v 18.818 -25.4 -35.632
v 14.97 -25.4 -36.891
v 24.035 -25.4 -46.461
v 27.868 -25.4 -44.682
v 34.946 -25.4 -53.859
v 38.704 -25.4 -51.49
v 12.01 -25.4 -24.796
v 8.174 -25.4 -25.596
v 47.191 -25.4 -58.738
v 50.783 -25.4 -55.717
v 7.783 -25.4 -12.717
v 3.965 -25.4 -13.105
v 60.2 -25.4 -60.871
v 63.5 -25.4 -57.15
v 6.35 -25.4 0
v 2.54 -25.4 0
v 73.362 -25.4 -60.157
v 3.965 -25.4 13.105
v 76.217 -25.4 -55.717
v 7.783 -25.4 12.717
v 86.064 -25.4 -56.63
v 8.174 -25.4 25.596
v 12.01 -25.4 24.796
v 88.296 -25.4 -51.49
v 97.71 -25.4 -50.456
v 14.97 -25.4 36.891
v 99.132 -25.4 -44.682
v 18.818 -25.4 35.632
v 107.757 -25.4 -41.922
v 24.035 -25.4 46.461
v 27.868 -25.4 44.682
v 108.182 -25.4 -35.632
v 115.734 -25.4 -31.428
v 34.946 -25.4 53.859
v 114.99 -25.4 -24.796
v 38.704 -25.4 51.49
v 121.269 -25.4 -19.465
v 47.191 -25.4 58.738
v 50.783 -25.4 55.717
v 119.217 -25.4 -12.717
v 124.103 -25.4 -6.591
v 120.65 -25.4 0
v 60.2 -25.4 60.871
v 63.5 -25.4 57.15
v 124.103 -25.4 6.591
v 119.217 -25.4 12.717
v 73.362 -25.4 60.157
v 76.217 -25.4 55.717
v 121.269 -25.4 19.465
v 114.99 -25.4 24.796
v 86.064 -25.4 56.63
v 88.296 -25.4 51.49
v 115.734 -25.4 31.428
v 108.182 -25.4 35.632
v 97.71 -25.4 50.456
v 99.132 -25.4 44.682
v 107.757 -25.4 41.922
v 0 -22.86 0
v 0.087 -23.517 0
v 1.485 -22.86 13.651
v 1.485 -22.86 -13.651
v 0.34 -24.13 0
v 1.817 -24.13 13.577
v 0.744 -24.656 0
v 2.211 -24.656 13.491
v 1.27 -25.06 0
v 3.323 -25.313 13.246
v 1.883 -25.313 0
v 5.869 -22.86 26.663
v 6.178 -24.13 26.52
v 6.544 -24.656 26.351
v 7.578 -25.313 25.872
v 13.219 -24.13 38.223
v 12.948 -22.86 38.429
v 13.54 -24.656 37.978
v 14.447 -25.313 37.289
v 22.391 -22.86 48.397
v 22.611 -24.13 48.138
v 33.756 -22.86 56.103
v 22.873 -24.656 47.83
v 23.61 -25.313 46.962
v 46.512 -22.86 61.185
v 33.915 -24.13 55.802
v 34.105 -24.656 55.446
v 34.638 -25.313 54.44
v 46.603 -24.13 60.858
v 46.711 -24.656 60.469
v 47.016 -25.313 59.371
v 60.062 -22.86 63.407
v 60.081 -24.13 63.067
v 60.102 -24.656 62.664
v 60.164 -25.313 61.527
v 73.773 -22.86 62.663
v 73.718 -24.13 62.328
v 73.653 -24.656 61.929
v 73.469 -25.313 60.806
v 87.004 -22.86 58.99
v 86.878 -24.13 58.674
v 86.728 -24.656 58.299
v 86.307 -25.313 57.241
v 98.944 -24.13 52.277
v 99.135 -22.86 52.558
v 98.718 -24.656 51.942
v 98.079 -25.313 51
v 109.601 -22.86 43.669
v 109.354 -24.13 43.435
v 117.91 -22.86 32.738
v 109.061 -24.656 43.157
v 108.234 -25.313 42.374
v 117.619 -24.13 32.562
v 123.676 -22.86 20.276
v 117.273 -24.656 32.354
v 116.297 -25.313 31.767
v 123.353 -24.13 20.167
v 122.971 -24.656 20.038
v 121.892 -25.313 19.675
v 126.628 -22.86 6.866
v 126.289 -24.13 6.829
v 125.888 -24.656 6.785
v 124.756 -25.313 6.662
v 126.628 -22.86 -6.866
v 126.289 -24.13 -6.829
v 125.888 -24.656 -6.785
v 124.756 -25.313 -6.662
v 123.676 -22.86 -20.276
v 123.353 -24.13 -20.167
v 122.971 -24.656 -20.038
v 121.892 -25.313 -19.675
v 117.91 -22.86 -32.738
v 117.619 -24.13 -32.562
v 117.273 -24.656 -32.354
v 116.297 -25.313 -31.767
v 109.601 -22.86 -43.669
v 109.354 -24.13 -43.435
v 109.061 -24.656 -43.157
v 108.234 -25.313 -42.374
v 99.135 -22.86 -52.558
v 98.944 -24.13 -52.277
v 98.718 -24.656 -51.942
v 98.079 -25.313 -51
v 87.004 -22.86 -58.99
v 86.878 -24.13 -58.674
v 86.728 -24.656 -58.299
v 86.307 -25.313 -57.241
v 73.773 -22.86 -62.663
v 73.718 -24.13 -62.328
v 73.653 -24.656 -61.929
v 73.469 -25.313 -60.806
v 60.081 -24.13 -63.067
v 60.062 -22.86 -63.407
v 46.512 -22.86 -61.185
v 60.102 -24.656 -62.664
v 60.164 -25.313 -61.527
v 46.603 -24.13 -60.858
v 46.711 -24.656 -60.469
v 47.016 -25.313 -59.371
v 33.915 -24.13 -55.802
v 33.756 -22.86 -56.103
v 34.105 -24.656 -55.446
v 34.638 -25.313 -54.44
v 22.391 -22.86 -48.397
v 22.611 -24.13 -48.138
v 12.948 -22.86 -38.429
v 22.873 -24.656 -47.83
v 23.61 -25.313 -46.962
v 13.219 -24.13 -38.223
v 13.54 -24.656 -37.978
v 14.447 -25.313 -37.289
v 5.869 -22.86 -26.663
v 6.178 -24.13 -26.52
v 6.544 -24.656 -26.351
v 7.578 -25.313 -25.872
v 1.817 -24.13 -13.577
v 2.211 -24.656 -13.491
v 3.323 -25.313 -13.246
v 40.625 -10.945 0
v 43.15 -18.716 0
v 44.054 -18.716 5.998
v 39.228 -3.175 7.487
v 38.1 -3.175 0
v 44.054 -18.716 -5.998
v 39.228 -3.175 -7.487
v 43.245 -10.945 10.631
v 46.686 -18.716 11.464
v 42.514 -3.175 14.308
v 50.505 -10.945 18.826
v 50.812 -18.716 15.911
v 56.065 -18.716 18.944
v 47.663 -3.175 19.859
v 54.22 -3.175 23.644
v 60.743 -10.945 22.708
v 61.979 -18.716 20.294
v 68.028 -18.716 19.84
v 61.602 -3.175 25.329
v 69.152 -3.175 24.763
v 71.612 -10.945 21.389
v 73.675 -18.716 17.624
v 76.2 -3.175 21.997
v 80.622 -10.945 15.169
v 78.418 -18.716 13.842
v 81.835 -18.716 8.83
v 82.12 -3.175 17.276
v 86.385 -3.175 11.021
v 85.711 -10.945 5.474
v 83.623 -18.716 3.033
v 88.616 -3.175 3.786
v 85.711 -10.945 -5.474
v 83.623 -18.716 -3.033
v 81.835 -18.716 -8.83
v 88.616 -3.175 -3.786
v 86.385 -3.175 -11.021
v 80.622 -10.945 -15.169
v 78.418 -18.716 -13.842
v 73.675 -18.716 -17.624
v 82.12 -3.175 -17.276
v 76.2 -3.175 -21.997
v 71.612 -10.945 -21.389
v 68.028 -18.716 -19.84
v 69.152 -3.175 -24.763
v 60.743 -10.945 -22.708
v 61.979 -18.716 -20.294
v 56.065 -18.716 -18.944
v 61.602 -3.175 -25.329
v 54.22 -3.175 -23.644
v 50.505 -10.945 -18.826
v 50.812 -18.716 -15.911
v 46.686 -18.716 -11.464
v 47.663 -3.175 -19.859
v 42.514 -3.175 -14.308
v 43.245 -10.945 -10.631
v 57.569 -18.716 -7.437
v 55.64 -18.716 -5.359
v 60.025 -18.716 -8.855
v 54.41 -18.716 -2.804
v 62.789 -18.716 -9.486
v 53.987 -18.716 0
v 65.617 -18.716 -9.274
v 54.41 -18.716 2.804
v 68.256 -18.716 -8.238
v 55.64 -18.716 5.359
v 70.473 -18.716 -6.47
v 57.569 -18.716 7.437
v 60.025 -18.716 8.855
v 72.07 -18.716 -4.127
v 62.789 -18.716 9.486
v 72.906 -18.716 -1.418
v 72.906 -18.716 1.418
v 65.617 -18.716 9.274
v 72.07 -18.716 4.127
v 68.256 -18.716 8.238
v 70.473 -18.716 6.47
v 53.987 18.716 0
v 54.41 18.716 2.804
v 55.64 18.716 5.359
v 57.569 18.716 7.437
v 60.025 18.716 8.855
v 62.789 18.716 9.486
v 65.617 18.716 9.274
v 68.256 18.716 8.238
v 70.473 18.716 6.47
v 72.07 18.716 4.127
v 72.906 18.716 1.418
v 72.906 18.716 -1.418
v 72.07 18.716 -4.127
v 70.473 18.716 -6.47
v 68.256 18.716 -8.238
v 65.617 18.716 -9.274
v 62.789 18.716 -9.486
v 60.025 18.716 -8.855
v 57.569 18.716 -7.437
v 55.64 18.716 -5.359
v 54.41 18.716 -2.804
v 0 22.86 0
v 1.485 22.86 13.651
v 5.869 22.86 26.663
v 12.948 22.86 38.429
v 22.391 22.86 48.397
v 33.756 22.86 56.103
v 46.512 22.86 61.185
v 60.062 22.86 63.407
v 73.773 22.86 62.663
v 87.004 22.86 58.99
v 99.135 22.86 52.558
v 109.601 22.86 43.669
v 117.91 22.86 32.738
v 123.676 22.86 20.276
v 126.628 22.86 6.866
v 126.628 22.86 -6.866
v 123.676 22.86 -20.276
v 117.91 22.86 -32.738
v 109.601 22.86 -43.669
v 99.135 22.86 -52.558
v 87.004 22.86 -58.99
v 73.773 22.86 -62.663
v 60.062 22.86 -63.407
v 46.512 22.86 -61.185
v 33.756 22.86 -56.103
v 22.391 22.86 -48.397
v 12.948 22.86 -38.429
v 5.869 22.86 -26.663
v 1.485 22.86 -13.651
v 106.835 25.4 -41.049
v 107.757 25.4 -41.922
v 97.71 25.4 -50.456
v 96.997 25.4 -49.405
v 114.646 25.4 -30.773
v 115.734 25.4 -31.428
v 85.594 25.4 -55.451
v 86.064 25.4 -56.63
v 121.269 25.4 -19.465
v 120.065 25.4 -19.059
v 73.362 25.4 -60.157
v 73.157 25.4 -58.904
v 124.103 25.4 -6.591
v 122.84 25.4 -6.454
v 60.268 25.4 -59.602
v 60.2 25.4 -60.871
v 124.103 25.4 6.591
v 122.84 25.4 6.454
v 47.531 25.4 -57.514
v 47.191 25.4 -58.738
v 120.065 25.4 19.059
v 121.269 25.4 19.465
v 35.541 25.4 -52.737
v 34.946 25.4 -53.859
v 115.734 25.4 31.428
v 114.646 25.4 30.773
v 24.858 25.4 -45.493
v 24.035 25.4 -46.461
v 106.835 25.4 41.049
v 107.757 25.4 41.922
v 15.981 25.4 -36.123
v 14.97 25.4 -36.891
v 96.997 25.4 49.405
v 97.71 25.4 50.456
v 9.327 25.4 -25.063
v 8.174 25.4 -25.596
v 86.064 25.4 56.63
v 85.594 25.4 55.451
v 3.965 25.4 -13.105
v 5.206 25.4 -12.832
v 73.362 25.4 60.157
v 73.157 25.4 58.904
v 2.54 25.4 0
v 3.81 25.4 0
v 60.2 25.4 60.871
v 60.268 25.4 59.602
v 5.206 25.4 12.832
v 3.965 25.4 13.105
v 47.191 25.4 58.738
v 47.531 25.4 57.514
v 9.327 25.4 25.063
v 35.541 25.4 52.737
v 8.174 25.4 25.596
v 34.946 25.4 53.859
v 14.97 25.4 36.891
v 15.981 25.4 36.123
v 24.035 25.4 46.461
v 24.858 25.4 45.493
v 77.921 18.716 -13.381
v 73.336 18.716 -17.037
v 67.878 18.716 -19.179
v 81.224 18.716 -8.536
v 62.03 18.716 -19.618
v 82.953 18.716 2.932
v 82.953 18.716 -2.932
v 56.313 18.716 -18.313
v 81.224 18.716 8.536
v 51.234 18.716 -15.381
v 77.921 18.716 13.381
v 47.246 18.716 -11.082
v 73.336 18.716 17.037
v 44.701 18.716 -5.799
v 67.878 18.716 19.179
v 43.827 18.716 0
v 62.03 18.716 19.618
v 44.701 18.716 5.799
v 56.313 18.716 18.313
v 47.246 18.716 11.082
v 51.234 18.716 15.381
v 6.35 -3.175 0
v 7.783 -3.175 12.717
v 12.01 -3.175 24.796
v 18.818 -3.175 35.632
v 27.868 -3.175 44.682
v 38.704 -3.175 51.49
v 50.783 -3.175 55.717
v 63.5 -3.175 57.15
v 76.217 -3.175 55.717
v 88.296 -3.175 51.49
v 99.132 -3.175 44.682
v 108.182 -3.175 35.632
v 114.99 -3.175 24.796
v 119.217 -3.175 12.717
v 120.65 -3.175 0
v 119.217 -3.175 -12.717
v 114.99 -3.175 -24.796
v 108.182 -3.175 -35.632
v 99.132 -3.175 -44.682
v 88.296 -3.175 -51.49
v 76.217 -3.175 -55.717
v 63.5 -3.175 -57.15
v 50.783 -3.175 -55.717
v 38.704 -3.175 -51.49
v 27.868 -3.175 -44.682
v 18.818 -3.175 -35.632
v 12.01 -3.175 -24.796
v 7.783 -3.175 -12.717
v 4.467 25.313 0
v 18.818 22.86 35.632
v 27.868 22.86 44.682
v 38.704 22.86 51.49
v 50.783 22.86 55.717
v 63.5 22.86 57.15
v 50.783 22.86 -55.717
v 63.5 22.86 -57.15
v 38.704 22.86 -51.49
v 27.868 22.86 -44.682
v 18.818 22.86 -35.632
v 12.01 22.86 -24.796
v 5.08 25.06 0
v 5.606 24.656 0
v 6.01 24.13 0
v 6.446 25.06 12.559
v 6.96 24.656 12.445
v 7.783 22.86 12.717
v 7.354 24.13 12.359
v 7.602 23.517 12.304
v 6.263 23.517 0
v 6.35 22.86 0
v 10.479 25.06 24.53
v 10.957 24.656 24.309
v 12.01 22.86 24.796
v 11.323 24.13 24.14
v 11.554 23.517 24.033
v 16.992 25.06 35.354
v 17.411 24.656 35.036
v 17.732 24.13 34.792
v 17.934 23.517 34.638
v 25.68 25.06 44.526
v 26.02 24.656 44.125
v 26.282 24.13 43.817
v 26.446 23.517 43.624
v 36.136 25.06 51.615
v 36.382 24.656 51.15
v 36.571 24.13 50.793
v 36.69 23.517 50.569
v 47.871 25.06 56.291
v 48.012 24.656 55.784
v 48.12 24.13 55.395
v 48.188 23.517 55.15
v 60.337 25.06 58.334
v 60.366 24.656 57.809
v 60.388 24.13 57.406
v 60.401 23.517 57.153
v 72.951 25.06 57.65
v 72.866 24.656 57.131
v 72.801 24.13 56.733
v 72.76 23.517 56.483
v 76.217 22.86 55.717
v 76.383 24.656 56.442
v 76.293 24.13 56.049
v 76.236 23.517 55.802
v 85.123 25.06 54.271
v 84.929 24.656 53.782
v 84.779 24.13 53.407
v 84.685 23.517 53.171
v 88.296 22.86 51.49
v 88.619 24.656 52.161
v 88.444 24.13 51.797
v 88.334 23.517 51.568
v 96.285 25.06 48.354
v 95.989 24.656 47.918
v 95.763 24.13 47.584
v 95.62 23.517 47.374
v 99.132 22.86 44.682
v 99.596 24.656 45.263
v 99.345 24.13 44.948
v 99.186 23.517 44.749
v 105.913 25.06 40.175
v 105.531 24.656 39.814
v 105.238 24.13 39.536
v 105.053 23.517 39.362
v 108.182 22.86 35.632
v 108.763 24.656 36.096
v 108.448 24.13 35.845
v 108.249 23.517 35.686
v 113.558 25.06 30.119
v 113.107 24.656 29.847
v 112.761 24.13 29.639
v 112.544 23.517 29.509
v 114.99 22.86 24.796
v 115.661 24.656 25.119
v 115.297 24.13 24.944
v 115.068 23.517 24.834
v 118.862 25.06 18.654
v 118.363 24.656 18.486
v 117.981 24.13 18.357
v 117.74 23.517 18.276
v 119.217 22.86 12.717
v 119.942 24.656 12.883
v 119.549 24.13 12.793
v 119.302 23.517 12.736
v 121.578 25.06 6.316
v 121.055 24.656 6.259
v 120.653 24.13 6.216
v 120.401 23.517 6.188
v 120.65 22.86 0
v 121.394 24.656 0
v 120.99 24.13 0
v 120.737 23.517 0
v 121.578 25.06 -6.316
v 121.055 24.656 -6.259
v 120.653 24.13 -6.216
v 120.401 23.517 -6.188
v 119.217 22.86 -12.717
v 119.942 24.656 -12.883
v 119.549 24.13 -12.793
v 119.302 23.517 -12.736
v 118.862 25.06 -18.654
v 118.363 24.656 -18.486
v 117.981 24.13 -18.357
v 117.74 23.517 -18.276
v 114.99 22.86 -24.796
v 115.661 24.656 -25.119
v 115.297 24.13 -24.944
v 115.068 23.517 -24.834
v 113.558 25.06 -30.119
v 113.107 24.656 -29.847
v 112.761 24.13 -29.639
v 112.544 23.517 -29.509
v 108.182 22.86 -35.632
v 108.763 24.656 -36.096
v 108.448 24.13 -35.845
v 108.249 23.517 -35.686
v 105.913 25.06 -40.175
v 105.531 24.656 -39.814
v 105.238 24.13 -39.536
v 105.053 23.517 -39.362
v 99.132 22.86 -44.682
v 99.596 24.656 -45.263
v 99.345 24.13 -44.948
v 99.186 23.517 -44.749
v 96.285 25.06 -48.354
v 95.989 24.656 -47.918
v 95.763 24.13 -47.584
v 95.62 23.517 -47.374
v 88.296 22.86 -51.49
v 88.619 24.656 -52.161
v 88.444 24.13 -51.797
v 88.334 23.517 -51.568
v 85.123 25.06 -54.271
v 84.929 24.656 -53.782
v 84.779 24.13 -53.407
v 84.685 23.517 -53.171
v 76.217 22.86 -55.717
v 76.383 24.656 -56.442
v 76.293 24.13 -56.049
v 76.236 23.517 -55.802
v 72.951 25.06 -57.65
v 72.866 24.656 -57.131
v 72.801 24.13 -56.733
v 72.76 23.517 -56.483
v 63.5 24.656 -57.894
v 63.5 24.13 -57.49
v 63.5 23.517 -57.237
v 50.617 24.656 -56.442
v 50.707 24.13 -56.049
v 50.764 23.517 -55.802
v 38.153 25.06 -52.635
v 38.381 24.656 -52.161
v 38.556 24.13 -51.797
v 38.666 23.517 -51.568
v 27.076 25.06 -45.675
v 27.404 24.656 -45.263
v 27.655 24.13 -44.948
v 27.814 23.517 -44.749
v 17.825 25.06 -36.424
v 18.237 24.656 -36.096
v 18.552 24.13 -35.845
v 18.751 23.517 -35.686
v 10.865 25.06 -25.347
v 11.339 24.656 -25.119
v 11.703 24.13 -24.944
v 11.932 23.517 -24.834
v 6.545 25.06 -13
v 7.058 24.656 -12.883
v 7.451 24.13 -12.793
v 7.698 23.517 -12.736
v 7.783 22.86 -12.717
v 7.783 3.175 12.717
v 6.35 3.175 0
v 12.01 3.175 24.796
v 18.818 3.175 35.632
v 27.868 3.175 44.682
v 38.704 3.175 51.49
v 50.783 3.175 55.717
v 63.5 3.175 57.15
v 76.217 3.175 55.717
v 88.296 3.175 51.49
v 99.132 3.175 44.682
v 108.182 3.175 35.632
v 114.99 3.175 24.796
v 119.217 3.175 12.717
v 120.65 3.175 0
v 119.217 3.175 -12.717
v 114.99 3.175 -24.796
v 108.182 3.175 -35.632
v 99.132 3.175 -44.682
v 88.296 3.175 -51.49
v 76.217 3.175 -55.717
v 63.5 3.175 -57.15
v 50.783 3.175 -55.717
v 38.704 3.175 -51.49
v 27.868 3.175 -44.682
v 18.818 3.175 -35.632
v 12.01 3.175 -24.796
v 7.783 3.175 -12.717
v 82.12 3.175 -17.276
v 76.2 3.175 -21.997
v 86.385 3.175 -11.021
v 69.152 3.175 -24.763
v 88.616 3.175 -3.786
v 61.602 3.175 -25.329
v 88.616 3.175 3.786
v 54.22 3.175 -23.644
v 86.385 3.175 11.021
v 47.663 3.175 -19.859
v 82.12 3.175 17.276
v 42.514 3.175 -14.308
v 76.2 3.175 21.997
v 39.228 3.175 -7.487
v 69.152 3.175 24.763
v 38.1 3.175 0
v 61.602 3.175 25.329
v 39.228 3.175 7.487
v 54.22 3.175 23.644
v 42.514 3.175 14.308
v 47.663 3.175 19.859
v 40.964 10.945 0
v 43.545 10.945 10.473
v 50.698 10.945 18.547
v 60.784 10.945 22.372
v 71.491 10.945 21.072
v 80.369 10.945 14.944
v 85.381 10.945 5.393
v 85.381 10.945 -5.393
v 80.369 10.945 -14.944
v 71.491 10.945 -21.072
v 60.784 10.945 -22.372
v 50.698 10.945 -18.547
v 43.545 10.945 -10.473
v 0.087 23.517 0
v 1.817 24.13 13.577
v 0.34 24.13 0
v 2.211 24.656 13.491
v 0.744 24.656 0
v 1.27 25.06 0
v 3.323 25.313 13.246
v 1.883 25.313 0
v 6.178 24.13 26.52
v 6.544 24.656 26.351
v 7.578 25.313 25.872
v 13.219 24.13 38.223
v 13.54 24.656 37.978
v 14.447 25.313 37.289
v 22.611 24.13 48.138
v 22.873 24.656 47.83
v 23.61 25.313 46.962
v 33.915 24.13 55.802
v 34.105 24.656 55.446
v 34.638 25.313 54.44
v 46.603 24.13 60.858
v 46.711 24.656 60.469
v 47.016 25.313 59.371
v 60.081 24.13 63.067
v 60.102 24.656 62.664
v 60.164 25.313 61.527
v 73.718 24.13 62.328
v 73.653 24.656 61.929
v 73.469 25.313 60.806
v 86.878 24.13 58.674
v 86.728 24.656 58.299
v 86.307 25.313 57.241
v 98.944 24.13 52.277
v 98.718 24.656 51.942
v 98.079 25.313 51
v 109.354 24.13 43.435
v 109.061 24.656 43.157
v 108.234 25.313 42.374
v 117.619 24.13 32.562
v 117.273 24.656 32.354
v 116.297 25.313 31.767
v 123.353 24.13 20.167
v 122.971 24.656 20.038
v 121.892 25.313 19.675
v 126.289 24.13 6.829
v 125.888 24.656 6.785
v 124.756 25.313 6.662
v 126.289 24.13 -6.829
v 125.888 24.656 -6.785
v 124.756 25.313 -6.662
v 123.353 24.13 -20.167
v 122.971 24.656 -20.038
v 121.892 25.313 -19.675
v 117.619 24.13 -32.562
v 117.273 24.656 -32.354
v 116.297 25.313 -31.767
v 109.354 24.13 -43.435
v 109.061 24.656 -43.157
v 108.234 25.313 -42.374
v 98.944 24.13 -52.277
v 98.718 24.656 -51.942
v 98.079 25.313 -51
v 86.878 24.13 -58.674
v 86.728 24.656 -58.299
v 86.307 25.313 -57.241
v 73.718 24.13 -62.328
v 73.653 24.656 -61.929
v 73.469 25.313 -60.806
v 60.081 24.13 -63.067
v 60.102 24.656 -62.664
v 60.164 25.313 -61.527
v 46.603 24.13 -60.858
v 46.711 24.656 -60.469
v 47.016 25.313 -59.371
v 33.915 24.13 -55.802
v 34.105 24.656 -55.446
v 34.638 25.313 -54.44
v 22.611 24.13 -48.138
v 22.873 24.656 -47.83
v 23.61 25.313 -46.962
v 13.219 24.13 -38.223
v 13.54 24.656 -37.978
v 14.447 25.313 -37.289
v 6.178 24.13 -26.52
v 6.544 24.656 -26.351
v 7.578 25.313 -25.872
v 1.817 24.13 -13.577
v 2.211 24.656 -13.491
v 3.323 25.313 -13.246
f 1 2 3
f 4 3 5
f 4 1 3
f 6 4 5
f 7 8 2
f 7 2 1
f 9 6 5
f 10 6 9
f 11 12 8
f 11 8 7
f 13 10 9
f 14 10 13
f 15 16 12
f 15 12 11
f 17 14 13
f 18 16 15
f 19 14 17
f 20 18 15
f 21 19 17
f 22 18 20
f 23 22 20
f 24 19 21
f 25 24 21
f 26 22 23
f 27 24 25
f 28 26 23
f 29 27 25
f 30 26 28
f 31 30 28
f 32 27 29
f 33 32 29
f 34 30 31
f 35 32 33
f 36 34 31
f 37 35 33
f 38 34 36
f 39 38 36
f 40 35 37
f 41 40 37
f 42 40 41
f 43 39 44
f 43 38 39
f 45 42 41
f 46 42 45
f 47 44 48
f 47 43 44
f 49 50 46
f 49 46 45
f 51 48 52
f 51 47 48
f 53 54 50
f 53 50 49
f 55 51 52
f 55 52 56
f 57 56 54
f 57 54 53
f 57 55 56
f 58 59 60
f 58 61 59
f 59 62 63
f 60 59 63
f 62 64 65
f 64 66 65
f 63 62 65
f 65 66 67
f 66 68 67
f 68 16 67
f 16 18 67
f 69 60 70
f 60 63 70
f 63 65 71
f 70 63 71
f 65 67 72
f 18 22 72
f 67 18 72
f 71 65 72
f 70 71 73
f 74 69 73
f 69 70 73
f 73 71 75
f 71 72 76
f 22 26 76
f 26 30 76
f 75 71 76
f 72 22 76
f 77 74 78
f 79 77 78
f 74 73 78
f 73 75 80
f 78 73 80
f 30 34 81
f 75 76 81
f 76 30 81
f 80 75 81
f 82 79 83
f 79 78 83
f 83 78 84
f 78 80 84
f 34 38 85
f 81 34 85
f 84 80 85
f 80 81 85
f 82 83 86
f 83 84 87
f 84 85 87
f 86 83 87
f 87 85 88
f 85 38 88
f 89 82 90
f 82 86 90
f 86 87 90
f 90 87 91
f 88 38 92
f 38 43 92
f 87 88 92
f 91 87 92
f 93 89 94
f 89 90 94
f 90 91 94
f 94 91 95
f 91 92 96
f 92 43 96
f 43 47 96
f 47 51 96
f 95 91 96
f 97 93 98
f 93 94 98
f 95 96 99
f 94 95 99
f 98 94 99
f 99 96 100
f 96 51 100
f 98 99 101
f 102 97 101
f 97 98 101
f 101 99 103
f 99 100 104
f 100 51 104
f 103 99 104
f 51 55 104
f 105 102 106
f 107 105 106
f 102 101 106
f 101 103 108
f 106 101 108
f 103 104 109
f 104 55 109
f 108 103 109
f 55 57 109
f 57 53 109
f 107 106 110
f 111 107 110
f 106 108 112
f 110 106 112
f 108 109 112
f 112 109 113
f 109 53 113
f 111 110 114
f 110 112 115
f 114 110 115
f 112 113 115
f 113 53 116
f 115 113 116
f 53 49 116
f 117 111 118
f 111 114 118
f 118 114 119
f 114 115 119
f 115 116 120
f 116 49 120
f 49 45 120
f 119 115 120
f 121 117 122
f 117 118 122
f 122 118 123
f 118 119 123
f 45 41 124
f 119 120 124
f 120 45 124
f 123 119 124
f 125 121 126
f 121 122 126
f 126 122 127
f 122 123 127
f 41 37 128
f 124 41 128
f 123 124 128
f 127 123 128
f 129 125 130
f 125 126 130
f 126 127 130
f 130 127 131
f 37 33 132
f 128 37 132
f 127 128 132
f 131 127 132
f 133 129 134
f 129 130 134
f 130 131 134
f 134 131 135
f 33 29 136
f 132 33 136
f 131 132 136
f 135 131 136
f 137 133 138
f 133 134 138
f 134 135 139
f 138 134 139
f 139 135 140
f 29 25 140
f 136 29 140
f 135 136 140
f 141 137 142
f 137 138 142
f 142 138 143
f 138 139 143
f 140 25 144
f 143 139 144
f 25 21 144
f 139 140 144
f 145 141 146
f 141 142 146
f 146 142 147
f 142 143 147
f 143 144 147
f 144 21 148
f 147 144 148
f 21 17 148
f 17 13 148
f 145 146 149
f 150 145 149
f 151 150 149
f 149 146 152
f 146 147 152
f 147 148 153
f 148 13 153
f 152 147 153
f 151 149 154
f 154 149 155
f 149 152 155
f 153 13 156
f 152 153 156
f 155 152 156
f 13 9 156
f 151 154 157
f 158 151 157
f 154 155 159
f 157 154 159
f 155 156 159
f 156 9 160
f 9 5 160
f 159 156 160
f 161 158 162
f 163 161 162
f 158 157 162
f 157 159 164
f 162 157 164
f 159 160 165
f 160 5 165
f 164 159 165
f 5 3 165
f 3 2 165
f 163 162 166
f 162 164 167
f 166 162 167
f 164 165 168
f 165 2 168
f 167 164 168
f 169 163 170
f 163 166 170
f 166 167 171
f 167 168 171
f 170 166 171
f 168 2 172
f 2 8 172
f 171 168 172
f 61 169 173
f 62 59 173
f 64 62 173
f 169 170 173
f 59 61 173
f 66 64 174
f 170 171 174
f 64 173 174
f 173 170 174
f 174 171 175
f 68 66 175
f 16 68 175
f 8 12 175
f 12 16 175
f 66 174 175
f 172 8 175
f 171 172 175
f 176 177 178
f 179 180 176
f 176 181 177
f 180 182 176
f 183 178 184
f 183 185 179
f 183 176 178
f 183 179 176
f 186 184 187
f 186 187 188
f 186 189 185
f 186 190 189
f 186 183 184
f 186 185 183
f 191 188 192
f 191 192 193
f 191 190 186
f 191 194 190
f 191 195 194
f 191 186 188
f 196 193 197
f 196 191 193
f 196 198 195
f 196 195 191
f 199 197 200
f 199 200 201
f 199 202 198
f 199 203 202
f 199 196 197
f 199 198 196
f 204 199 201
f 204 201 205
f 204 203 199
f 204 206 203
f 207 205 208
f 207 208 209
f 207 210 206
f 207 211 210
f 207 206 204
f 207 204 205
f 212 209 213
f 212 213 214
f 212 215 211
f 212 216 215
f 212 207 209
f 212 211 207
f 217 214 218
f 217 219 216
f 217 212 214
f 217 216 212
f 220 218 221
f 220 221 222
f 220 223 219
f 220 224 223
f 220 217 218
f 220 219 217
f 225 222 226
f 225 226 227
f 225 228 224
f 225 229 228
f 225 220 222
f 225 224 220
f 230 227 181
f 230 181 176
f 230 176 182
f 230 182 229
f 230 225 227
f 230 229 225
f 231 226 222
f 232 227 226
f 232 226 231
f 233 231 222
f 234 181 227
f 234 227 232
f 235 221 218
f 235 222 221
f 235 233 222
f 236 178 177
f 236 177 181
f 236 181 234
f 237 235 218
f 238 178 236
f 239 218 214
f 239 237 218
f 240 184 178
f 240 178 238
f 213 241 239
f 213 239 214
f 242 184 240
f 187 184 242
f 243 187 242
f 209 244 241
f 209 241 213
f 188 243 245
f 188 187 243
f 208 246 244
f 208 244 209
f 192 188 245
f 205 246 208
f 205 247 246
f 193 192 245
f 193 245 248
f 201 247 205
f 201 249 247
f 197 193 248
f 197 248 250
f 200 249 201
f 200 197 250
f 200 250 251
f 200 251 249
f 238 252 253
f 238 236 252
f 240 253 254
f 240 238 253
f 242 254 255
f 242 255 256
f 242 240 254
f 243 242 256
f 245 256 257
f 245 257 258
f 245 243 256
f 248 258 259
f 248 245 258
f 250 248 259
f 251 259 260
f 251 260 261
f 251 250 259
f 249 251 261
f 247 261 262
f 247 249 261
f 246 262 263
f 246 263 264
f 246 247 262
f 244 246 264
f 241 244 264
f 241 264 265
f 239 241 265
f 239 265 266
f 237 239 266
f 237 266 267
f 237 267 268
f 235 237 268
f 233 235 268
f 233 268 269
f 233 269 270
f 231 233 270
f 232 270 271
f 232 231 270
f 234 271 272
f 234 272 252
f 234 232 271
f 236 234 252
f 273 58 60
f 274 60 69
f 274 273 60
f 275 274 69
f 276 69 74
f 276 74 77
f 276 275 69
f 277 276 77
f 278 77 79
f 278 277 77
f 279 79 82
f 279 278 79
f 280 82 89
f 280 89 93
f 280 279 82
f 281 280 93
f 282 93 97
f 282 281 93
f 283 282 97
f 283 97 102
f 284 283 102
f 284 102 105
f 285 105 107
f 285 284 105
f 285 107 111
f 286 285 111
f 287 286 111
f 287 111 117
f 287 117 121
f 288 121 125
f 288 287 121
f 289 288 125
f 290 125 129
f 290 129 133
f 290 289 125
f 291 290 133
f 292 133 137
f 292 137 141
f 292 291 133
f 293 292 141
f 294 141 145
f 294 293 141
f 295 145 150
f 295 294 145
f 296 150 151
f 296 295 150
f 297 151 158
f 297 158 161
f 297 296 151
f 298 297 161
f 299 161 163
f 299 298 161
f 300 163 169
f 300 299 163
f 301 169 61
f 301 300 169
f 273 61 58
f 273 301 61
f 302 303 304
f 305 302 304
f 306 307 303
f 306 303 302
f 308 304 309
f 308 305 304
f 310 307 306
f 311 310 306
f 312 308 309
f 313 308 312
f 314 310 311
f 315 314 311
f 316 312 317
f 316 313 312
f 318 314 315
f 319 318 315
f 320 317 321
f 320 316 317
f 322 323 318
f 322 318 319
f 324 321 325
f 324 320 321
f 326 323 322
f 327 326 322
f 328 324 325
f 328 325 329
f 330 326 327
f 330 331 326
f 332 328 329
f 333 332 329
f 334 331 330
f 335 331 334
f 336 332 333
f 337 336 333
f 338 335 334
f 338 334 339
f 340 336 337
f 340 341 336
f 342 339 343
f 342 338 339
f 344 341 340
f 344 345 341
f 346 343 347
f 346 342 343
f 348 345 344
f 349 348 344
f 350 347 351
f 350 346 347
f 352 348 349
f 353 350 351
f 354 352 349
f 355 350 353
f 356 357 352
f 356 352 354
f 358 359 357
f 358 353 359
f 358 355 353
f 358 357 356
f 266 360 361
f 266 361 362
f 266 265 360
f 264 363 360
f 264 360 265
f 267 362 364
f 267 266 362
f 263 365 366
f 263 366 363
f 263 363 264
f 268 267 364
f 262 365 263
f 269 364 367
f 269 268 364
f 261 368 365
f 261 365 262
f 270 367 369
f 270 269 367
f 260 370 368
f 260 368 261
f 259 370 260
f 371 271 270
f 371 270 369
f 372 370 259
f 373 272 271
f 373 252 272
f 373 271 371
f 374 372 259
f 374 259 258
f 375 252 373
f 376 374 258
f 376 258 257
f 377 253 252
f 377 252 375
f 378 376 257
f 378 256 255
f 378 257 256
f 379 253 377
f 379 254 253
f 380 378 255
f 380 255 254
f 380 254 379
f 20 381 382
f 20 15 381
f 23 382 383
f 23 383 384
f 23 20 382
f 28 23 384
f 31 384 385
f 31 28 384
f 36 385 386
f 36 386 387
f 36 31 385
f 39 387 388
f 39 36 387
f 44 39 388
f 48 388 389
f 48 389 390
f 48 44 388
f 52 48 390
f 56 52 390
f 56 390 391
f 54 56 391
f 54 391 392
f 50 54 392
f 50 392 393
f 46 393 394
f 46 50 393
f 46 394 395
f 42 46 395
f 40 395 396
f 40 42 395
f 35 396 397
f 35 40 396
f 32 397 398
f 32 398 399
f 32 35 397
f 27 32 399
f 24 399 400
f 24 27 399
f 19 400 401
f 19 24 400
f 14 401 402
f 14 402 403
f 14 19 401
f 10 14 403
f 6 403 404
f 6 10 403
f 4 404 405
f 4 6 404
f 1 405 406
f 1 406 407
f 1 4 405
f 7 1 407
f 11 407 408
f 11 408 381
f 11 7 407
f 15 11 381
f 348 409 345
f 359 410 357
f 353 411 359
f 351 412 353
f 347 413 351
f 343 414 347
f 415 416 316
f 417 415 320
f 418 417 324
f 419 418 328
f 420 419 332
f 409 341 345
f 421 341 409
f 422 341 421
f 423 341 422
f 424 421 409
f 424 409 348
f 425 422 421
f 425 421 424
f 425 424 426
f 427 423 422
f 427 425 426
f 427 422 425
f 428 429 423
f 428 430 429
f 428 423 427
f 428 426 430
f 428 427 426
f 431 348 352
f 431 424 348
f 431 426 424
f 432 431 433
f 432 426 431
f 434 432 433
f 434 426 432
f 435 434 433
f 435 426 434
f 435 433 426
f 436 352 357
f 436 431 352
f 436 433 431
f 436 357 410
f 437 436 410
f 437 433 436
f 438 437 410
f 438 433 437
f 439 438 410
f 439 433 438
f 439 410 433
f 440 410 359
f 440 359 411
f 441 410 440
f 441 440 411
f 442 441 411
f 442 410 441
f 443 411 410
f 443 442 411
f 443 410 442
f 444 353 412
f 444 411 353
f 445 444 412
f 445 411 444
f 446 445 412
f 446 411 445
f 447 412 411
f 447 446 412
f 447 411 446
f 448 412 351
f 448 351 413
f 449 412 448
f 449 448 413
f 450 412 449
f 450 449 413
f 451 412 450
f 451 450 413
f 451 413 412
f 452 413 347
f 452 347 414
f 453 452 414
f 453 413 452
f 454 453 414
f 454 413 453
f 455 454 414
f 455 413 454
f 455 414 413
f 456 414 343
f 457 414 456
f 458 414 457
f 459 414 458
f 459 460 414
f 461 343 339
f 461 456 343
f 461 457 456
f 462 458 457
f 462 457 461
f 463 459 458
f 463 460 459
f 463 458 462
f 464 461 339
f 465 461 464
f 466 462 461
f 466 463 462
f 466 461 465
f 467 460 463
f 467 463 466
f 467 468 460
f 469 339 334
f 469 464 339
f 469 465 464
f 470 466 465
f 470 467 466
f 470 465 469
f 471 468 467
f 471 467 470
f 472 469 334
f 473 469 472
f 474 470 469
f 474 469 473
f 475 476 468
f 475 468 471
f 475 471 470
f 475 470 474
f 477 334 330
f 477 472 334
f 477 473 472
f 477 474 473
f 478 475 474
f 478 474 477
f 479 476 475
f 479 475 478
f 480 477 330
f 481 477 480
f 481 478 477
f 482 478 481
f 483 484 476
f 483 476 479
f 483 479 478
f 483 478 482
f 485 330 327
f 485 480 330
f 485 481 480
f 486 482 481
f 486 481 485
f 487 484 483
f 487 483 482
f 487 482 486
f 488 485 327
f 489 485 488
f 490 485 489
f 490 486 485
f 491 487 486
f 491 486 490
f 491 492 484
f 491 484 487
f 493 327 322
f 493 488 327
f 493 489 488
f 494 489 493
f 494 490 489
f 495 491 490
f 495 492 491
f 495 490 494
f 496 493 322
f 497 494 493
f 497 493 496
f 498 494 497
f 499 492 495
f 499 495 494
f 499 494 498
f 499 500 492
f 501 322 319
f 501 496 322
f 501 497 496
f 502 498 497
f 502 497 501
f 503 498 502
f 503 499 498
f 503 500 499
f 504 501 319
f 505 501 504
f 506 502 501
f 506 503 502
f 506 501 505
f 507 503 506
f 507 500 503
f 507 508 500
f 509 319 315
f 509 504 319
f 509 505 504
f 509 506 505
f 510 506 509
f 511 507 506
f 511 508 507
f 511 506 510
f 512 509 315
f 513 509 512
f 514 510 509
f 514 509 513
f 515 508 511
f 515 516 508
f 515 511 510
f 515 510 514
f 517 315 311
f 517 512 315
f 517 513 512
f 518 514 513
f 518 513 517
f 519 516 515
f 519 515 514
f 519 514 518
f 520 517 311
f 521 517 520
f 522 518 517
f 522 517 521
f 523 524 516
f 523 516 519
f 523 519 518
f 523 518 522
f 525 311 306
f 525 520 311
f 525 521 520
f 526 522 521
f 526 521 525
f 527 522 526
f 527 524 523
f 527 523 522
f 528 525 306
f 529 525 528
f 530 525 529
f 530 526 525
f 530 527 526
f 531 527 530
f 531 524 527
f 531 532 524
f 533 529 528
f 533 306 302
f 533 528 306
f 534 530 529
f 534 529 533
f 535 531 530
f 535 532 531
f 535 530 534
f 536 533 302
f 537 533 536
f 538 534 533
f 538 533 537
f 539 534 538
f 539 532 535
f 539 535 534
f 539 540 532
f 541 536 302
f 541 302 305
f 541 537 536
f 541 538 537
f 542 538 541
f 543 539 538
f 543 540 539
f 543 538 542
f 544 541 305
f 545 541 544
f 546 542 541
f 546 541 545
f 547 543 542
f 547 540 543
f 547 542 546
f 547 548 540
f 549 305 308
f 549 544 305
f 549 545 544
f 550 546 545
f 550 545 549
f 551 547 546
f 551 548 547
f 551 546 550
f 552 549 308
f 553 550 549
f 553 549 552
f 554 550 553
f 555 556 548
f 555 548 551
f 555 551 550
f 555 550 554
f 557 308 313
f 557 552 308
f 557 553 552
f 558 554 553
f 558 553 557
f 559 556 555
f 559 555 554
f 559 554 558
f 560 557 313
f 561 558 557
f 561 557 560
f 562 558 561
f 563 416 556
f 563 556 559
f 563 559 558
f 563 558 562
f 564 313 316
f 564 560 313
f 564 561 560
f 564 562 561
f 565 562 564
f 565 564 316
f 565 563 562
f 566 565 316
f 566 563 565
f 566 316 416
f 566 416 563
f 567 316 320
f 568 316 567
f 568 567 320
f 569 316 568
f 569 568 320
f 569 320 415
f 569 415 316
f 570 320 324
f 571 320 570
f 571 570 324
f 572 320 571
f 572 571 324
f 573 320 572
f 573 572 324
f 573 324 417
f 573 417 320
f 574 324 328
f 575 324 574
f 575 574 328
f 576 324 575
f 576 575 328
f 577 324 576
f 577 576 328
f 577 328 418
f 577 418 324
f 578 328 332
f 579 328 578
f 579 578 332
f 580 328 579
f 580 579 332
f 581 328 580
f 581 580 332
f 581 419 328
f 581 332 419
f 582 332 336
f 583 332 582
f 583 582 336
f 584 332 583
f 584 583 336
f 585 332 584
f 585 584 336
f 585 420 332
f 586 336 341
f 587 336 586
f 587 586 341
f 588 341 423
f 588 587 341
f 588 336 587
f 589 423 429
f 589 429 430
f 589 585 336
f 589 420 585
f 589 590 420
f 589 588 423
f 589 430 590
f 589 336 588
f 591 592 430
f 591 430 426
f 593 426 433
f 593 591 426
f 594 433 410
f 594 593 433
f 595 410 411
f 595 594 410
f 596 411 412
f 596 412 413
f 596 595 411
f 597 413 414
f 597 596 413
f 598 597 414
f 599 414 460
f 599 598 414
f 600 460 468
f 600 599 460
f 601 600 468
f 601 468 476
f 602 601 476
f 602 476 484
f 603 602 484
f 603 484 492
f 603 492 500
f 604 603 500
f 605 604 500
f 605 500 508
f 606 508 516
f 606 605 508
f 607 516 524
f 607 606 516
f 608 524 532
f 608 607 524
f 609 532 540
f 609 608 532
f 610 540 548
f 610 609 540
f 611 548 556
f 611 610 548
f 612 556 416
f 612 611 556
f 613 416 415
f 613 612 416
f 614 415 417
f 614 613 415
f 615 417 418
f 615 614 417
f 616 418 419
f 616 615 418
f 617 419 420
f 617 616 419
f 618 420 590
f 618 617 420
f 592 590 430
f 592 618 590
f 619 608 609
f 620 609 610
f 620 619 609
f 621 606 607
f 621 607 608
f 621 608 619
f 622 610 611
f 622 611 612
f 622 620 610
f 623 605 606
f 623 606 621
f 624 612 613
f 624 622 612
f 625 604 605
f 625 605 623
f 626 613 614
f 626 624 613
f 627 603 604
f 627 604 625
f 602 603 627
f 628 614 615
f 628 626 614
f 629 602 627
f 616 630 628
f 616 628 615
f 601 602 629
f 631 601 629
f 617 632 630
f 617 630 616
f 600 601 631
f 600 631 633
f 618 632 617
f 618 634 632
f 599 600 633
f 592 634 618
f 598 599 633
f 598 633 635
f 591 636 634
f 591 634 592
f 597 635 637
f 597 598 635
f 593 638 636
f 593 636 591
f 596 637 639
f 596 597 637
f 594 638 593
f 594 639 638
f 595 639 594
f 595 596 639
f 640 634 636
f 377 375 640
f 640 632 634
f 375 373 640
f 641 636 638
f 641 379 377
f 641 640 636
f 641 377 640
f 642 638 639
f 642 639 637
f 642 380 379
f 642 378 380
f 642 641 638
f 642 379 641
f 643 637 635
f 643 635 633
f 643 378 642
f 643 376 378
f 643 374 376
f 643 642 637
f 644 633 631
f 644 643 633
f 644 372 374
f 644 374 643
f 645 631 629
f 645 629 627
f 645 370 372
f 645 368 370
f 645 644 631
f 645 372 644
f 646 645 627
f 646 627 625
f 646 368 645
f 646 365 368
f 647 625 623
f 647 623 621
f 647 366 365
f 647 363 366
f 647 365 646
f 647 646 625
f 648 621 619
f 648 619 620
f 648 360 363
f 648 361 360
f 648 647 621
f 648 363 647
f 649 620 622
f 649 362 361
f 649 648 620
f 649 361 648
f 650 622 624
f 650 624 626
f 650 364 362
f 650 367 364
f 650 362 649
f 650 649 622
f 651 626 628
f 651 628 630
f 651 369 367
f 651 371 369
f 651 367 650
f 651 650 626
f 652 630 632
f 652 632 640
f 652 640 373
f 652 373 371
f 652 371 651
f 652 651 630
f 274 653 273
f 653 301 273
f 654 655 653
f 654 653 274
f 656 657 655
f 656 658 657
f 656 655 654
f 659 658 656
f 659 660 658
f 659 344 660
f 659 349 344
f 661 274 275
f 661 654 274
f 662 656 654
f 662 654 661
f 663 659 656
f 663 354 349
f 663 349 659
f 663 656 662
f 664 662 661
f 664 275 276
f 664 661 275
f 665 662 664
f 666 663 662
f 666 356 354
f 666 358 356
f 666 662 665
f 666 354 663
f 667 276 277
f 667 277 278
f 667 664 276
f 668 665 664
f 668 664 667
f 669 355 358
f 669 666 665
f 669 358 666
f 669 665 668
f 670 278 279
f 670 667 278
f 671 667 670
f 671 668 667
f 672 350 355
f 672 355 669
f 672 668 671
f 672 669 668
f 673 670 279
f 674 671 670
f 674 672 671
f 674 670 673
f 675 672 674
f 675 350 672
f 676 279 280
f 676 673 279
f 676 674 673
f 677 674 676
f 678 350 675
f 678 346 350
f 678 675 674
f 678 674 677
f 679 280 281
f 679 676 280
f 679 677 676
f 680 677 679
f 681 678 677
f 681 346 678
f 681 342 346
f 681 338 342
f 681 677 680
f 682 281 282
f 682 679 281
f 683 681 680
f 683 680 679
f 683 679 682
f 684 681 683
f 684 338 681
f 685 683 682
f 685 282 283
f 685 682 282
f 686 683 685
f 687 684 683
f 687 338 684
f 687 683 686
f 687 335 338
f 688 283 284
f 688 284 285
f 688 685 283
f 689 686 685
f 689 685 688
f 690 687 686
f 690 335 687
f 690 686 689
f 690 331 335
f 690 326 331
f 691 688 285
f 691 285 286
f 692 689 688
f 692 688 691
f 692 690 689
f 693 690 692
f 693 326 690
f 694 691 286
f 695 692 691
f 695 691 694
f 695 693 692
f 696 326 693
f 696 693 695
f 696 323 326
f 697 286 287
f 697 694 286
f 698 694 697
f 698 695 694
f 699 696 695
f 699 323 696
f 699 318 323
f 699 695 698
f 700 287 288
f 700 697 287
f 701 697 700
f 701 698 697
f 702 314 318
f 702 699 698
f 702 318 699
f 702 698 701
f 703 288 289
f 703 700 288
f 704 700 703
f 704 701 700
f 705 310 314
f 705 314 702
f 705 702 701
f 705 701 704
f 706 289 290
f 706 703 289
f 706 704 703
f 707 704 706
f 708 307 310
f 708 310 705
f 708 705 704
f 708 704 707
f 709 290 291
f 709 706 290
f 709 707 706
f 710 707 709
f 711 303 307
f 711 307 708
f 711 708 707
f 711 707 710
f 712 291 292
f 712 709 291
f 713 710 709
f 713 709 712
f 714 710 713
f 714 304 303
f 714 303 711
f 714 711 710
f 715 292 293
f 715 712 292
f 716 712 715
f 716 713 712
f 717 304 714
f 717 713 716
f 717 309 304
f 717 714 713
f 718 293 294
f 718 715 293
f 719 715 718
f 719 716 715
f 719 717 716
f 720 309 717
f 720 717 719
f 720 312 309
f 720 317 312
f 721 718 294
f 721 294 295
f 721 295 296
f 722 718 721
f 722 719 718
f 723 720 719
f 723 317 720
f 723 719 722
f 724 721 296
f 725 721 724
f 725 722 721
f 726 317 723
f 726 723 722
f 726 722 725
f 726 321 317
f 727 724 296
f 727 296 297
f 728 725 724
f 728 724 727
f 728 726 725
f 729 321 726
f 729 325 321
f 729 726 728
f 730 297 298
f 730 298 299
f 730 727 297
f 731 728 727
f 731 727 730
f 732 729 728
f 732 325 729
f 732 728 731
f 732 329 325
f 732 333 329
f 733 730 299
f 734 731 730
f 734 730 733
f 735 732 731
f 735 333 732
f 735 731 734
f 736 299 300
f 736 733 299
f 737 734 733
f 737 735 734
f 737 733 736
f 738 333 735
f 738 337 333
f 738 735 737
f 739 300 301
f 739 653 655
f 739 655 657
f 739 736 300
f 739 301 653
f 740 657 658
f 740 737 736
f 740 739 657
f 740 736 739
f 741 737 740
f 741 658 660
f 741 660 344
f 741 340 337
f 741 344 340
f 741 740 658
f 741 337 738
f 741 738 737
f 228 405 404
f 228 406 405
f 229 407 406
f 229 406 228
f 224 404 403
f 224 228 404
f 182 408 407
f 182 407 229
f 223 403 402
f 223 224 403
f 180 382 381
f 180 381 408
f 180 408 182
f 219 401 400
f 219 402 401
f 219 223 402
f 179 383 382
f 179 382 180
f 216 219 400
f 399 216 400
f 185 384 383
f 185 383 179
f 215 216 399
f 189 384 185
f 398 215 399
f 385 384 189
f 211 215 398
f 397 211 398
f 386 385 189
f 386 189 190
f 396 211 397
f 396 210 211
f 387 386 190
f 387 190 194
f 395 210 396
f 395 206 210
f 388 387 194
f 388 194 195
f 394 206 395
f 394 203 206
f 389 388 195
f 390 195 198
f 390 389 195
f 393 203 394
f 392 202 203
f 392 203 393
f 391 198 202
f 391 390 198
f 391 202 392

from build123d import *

# Parameters (mm, degrees)
FILLET1_R = 2.54


with BuildPart() as part:
    # Sketch1 → Revolve2 (revolve)
    with BuildSketch(Plane.XY):
        Polygon((0, -25.4), (0, 25.4), (6.35, 25.4), (6.35, 3.175), (38.1, 3.175), (43.827481803, 18.715945904), (53.987481803, 18.715945904), (53.987481803, -18.715945904), (43.149559422, -18.715945904), (38.1, -3.175), (6.35, -3.175), (6.35, -25.4), align=None)
    revolve(axis=Axis((63.5, 0, 0), (0, 1, 0)))

    # Fillet1
    fillet1_edges = [part.edges().sort_by_distance(p)[0] for p in [
        (120.65, 25.4, 0),
        (127, 25.4, 0),
        (127, -25.4, 0),
    ]]
    fillet(fillet1_edges, radius=FILLET1_R)


solid = part.part
